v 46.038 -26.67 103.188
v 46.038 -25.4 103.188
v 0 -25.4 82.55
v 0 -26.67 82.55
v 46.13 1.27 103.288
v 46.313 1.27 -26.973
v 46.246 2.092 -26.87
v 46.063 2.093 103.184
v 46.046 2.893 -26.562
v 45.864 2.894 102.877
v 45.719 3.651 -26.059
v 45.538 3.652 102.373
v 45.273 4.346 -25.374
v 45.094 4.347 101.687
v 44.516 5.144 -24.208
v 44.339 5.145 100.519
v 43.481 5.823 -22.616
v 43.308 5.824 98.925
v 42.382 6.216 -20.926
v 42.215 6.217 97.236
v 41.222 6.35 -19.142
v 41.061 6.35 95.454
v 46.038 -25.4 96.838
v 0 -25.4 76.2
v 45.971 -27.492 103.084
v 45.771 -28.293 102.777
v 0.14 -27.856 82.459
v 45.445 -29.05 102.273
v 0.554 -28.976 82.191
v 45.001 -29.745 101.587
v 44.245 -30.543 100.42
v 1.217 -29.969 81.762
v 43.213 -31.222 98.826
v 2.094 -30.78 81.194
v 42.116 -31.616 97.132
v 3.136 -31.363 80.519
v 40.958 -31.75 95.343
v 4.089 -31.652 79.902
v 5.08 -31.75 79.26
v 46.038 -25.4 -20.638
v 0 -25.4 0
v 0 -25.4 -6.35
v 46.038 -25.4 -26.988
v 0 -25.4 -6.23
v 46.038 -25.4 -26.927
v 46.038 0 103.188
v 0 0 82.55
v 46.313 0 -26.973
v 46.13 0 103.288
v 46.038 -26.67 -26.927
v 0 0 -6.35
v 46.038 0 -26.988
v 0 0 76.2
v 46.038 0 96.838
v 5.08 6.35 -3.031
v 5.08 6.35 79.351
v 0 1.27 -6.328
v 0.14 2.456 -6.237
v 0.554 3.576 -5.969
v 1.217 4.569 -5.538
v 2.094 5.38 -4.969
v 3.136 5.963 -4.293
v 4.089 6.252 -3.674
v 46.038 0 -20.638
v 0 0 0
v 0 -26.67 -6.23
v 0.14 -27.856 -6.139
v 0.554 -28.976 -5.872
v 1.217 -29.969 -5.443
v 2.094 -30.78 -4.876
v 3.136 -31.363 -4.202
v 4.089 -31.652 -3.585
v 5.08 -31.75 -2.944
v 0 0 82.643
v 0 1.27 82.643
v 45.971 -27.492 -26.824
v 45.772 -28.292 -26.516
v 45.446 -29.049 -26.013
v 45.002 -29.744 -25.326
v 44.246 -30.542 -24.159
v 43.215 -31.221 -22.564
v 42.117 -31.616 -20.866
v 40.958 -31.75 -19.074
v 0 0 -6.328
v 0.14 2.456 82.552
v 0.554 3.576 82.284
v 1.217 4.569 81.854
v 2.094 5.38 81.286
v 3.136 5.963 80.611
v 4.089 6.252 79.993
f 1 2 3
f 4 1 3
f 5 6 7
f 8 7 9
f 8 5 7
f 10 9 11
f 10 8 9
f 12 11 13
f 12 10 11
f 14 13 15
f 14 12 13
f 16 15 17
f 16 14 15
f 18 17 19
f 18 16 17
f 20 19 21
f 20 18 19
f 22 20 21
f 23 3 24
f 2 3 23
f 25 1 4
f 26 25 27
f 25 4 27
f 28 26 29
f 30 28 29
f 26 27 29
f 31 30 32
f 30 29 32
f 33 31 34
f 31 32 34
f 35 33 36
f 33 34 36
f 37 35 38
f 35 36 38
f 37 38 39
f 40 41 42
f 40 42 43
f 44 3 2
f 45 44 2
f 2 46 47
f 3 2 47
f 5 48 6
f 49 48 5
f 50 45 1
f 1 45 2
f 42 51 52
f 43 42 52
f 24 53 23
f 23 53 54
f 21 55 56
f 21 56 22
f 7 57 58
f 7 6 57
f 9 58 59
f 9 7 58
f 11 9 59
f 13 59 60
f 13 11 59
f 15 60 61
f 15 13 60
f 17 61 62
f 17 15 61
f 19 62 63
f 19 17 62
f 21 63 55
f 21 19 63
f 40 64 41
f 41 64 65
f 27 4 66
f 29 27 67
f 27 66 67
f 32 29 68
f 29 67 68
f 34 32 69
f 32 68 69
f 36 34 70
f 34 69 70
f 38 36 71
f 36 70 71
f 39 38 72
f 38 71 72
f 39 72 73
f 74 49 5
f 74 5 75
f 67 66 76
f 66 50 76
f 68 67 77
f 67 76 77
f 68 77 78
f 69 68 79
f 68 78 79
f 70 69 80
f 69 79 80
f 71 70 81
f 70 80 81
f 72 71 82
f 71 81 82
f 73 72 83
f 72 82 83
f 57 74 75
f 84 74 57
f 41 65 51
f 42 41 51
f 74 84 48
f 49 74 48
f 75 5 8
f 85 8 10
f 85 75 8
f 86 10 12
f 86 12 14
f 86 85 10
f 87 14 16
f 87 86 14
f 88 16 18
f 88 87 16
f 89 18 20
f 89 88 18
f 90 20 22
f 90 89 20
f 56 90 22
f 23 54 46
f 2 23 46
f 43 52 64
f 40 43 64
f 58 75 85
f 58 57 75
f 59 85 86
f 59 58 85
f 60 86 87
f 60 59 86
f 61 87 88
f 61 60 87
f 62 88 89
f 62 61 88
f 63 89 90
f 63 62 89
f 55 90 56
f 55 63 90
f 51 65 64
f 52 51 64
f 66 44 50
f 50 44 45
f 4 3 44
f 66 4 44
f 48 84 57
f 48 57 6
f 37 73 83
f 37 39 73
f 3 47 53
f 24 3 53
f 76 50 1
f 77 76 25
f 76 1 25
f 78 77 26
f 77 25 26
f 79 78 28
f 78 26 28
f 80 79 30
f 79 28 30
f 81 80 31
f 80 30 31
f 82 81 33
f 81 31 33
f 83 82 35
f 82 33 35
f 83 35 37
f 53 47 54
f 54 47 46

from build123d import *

# Parameters (mm, degrees)
F1_DEPTH = 25.4
F2_DEPTH = 25.4
F4_DEPTH = 6.35
F6_DEPTH = 6.35
F7_R     = 5.08
F8_R     = 5.08


with BuildPart() as f1:
    # F0 (on Front) → F1 (new body)
    with BuildSketch(Plane.XZ):
        Polygon((0, 82.55), (0, 76.2), (46.0375, 96.8375), (46.0375, 103.1875), align=None)
    extrude(amount=F1_DEPTH)


with BuildPart() as f2:
    # F0 (on Front) → F2 (new body)
    with BuildSketch(Plane.XZ):
        Polygon((46.0375, -20.6375), (0, 0), (0, -6.35), (46.0375, -26.9875), align=None)
    extrude(amount=F2_DEPTH)


with BuildPart() as f4:
    # F3 (on Front) → F4 (new body)
    with BuildSketch(Plane.XZ):
        Polygon((46.312772, -26.972834), (46.13008, 103.287548), (0, 82.643196), (0, -6.328482), align=None)
    extrude(amount=-F4_DEPTH)

    # F8
    f8_edges = [f4.edges().sort_by_distance(p)[0] for p in [
        (23.06504, 6.35, 92.965372),
        (23.156386, 6.35, -16.650658),
        (46.221426, 6.35, 38.157357),
        (0, 6.35, 38.157357),
    ]]
    fillet(f8_edges, radius=F8_R)


with BuildPart() as f6:
    # F5 (on face) → F6 (new body)
    with BuildSketch(Plane.XZ.offset(25.4)):
        Polygon((46.0375, 103.1875), (0, 82.55), (0, -6.230049), (46.0375, -26.92748), align=None)
    extrude(amount=F6_DEPTH)

    # F7
    f7_edges = [f6.edges().sort_by_distance(p)[0] for p in [
        (23.01875, -31.75, -16.578765),
        (46.0375, -31.75, 38.13001),
        (23.01875, -31.75, 92.86875),
        (0, -31.75, 38.159975),
    ]]
    fillet(f7_edges, radius=F7_R)


solid = Compound([f1.part, f2.part, f4.part, f6.part])
